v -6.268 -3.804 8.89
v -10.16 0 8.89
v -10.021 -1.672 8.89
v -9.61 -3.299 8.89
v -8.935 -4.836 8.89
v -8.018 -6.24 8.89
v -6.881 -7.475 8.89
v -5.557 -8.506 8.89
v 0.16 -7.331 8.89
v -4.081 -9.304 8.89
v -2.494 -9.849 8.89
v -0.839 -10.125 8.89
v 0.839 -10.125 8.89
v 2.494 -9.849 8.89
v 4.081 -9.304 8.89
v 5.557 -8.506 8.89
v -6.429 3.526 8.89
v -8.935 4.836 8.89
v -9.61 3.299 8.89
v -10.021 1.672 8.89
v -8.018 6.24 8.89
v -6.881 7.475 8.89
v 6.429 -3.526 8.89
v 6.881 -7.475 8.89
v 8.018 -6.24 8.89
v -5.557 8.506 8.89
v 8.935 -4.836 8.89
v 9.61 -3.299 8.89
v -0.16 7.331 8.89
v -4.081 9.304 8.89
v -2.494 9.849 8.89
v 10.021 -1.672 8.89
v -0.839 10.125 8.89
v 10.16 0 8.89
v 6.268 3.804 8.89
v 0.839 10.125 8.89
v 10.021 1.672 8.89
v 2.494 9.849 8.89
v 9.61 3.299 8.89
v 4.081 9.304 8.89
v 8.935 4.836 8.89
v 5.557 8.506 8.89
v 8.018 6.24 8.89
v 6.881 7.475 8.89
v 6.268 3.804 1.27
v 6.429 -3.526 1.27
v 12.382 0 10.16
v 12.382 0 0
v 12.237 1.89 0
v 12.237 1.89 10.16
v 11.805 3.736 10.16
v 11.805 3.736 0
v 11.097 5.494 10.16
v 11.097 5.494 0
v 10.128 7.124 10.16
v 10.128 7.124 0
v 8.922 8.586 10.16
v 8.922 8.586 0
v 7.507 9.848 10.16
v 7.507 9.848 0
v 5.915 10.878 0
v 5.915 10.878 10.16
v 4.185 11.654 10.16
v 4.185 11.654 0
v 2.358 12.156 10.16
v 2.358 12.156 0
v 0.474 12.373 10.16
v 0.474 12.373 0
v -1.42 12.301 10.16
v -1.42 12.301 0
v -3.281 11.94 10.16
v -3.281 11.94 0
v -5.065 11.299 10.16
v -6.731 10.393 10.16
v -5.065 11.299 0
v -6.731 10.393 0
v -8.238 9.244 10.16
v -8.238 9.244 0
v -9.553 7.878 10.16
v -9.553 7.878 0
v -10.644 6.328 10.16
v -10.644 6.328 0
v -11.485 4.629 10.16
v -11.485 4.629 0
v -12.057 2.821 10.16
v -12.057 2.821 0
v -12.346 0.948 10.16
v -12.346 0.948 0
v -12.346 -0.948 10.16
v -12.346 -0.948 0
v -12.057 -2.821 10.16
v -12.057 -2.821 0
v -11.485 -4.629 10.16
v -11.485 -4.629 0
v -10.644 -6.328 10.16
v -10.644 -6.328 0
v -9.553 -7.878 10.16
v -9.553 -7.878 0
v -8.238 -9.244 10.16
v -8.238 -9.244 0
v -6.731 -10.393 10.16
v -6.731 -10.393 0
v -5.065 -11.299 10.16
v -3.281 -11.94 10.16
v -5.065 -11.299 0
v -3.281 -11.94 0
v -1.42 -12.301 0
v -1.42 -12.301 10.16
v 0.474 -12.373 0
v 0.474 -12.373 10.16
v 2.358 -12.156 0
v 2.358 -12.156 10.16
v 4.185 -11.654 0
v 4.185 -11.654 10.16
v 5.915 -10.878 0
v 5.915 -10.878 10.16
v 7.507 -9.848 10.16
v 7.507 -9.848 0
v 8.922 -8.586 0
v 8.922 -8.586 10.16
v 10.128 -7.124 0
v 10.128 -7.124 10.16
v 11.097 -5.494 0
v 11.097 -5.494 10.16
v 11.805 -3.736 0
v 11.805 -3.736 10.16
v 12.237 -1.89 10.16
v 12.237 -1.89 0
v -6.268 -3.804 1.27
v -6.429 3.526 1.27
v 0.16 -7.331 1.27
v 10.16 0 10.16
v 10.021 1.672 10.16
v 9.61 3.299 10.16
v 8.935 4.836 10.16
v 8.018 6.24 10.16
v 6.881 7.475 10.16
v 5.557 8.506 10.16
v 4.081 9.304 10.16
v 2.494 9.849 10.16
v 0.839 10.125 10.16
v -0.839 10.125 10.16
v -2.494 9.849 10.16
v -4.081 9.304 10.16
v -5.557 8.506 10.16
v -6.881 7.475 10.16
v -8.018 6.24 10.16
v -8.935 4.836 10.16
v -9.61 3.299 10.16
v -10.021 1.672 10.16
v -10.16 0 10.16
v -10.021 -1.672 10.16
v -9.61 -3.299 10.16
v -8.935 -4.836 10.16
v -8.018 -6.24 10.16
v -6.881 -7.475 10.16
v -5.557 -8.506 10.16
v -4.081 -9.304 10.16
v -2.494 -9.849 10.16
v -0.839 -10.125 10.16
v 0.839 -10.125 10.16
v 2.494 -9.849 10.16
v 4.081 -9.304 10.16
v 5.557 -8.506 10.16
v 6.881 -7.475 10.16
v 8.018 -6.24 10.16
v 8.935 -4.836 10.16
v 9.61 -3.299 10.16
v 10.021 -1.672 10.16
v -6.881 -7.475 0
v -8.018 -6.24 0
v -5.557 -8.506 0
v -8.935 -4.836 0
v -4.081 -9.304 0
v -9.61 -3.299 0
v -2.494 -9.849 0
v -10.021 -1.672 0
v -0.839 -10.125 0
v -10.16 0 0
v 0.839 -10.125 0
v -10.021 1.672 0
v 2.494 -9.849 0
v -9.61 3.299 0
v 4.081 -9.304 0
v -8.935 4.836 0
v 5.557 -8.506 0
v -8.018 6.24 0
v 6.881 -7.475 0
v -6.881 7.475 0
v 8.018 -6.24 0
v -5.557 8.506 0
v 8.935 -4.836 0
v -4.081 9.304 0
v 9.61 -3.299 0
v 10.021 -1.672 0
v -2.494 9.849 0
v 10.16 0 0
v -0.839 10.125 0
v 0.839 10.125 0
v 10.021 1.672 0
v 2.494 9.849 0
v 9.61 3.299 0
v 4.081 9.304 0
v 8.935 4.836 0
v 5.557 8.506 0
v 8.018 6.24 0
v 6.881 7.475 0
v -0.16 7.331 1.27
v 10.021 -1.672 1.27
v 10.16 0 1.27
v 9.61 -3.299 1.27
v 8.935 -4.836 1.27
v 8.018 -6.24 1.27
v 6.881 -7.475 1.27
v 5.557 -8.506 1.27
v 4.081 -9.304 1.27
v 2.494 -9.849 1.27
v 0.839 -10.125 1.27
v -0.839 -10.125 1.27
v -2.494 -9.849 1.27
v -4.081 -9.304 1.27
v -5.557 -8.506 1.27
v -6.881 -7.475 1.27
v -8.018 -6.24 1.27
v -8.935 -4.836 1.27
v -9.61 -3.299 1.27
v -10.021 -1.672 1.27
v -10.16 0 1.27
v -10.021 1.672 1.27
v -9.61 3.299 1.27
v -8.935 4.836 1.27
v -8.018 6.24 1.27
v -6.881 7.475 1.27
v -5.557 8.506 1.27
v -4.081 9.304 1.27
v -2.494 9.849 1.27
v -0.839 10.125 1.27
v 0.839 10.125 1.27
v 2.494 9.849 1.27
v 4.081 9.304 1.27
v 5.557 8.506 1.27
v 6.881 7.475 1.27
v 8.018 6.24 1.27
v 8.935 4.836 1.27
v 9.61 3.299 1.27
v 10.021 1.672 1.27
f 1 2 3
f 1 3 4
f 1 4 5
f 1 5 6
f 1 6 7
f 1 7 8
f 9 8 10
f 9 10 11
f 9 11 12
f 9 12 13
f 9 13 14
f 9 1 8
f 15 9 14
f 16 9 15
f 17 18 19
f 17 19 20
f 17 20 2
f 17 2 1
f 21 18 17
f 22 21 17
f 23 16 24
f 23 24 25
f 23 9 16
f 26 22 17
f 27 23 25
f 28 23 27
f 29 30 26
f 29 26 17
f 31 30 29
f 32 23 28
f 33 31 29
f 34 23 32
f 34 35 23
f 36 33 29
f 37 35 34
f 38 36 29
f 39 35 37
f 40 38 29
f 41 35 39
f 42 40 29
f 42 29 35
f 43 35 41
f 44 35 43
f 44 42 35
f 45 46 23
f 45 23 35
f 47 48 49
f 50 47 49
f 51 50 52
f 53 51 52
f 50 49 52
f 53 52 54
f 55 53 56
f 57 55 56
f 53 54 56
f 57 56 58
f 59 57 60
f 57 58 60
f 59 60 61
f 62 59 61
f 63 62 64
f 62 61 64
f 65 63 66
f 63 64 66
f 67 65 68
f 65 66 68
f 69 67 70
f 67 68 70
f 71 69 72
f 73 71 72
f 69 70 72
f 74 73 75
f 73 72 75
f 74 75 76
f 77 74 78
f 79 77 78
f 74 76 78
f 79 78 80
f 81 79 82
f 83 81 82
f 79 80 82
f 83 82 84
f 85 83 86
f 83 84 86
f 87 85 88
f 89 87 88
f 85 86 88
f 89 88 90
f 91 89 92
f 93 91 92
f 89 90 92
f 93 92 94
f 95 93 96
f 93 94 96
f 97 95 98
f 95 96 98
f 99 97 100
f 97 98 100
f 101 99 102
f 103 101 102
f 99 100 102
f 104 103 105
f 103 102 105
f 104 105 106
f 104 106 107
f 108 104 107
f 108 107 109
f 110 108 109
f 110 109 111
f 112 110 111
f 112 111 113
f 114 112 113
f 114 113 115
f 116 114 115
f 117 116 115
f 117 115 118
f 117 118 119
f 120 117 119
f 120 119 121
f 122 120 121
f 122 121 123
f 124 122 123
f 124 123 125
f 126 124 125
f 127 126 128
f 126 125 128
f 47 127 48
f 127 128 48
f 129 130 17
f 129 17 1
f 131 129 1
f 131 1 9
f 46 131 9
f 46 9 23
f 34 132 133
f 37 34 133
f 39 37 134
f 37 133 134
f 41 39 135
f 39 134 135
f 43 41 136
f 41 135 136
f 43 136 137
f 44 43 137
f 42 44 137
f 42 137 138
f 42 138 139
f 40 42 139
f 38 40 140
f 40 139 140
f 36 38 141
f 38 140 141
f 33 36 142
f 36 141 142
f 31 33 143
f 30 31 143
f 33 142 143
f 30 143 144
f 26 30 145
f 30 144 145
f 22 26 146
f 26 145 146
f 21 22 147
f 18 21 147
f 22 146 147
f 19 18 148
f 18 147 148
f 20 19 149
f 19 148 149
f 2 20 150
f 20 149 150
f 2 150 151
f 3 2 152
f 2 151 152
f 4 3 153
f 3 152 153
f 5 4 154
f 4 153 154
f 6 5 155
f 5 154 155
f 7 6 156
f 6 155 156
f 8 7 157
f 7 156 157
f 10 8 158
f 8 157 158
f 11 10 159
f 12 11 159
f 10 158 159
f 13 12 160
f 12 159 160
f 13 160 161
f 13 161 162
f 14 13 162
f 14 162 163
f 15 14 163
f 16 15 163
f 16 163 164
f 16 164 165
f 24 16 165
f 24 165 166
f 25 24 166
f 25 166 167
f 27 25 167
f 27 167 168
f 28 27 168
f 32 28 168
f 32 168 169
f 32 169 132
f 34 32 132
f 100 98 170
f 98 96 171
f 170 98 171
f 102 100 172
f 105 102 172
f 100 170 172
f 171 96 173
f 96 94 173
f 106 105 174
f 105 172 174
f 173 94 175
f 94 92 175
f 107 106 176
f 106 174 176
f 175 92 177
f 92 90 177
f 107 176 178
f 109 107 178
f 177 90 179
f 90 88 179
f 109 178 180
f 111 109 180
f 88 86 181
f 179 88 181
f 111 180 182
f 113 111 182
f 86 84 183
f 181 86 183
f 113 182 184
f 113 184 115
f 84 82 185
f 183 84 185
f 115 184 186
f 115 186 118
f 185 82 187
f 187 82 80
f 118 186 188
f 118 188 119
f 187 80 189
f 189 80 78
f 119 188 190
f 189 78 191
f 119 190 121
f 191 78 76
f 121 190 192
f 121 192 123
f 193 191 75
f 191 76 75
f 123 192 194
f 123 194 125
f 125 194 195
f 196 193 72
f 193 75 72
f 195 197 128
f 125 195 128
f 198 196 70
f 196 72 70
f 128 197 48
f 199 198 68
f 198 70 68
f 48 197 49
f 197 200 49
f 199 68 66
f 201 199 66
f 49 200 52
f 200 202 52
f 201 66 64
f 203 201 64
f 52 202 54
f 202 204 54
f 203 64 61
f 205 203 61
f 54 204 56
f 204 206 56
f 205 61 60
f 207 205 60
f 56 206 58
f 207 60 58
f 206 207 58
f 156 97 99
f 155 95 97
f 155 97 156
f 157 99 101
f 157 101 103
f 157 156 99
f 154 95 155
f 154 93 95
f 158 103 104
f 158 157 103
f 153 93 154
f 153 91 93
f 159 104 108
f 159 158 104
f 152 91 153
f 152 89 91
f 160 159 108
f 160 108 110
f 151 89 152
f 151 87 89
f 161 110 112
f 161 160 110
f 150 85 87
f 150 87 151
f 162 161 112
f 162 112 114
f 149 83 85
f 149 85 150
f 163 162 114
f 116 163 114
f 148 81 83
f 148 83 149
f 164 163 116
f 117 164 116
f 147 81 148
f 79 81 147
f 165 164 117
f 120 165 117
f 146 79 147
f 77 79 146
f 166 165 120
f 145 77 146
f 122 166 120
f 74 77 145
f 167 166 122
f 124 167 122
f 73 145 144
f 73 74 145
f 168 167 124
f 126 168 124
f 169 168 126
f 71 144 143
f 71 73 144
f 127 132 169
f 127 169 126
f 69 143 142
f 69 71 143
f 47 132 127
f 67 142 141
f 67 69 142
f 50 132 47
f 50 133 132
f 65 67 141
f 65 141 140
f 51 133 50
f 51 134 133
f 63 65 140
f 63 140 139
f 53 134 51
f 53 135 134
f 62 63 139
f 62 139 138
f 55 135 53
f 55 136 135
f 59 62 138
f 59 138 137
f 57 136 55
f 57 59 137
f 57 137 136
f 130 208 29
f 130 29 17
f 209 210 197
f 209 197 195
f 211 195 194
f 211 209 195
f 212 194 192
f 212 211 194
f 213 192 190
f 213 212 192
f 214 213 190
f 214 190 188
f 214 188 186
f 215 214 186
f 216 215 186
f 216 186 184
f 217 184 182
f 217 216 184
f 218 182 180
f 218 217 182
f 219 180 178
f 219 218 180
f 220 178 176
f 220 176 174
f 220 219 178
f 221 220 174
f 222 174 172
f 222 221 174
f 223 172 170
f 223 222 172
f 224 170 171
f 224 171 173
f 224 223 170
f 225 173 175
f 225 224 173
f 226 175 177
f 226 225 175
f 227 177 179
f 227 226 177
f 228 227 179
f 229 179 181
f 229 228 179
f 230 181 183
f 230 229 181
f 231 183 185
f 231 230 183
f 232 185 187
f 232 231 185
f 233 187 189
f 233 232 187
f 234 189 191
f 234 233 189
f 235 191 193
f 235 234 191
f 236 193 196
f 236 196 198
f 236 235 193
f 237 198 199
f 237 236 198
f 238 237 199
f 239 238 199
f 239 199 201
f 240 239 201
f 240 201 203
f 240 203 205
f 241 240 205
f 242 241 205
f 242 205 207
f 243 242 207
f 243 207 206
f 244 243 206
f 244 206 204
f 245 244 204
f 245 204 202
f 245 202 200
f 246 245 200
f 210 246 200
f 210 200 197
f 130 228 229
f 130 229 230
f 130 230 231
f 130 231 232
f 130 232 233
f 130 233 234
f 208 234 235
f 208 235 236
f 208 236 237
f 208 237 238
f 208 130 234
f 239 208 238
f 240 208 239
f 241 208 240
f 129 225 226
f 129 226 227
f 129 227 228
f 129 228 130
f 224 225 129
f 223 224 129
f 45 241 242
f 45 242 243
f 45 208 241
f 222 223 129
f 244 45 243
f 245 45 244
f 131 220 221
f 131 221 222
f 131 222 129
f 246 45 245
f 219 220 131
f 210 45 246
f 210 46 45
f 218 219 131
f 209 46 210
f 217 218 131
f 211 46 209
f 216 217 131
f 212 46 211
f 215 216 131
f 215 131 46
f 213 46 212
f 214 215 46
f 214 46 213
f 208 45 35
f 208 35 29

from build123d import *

# Parameters (mm, degrees)
SKETCH1_R               = 12.3825
BOSS_EXTRUDE1_DEPTH     = 10.16
ESQUISSE1_R             = 10.16
ENL_V_MAT_EXTRU_1_DEPTH = 1.27
ENL_V_START             = -1.27
ESQUISSE2_R             = 10.16
ENL_V_MAT_EXTRU_2_DEPTH = 1.27


with BuildPart() as part:
    # Sketch1 → Boss-Extrude1 (new body)
    with BuildSketch(Plane.XY):
        Circle(SKETCH1_R)
        Polygon((0.160352547, -7.330594819), (6.428657611, -3.52642803), (6.268305064, 3.804166789), (-0.160352547, 7.330594819), (-6.428657611, 3.52642803), (-6.268305064, -3.804166789), align=None, mode=Mode.SUBTRACT)
    extrude(amount=BOSS_EXTRUDE1_DEPTH)

    # Esquisse1 → Enlèv. mat.-Extru.1 (cut)
    with BuildSketch(Plane.XY.offset(10.16)):
        Circle(ESQUISSE1_R)
    extrude(amount=-ENL_V_MAT_EXTRU_1_DEPTH, mode=Mode.SUBTRACT)

    # Esquisse2 → Enlèv. mat.-Extru.2 (cut)
    with BuildSketch(Plane(origin=(0, 0, 0), x_dir=(-1, 0, 0), z_dir=(0, 0, -1)).offset(ENL_V_START)):
        with Locations(Location((0, 0, 0), (0, 0, 180))):
            Circle(ESQUISSE2_R)
    extrude(amount=ENL_V_MAT_EXTRU_2_DEPTH, mode=Mode.SUBTRACT)


solid = part.part
